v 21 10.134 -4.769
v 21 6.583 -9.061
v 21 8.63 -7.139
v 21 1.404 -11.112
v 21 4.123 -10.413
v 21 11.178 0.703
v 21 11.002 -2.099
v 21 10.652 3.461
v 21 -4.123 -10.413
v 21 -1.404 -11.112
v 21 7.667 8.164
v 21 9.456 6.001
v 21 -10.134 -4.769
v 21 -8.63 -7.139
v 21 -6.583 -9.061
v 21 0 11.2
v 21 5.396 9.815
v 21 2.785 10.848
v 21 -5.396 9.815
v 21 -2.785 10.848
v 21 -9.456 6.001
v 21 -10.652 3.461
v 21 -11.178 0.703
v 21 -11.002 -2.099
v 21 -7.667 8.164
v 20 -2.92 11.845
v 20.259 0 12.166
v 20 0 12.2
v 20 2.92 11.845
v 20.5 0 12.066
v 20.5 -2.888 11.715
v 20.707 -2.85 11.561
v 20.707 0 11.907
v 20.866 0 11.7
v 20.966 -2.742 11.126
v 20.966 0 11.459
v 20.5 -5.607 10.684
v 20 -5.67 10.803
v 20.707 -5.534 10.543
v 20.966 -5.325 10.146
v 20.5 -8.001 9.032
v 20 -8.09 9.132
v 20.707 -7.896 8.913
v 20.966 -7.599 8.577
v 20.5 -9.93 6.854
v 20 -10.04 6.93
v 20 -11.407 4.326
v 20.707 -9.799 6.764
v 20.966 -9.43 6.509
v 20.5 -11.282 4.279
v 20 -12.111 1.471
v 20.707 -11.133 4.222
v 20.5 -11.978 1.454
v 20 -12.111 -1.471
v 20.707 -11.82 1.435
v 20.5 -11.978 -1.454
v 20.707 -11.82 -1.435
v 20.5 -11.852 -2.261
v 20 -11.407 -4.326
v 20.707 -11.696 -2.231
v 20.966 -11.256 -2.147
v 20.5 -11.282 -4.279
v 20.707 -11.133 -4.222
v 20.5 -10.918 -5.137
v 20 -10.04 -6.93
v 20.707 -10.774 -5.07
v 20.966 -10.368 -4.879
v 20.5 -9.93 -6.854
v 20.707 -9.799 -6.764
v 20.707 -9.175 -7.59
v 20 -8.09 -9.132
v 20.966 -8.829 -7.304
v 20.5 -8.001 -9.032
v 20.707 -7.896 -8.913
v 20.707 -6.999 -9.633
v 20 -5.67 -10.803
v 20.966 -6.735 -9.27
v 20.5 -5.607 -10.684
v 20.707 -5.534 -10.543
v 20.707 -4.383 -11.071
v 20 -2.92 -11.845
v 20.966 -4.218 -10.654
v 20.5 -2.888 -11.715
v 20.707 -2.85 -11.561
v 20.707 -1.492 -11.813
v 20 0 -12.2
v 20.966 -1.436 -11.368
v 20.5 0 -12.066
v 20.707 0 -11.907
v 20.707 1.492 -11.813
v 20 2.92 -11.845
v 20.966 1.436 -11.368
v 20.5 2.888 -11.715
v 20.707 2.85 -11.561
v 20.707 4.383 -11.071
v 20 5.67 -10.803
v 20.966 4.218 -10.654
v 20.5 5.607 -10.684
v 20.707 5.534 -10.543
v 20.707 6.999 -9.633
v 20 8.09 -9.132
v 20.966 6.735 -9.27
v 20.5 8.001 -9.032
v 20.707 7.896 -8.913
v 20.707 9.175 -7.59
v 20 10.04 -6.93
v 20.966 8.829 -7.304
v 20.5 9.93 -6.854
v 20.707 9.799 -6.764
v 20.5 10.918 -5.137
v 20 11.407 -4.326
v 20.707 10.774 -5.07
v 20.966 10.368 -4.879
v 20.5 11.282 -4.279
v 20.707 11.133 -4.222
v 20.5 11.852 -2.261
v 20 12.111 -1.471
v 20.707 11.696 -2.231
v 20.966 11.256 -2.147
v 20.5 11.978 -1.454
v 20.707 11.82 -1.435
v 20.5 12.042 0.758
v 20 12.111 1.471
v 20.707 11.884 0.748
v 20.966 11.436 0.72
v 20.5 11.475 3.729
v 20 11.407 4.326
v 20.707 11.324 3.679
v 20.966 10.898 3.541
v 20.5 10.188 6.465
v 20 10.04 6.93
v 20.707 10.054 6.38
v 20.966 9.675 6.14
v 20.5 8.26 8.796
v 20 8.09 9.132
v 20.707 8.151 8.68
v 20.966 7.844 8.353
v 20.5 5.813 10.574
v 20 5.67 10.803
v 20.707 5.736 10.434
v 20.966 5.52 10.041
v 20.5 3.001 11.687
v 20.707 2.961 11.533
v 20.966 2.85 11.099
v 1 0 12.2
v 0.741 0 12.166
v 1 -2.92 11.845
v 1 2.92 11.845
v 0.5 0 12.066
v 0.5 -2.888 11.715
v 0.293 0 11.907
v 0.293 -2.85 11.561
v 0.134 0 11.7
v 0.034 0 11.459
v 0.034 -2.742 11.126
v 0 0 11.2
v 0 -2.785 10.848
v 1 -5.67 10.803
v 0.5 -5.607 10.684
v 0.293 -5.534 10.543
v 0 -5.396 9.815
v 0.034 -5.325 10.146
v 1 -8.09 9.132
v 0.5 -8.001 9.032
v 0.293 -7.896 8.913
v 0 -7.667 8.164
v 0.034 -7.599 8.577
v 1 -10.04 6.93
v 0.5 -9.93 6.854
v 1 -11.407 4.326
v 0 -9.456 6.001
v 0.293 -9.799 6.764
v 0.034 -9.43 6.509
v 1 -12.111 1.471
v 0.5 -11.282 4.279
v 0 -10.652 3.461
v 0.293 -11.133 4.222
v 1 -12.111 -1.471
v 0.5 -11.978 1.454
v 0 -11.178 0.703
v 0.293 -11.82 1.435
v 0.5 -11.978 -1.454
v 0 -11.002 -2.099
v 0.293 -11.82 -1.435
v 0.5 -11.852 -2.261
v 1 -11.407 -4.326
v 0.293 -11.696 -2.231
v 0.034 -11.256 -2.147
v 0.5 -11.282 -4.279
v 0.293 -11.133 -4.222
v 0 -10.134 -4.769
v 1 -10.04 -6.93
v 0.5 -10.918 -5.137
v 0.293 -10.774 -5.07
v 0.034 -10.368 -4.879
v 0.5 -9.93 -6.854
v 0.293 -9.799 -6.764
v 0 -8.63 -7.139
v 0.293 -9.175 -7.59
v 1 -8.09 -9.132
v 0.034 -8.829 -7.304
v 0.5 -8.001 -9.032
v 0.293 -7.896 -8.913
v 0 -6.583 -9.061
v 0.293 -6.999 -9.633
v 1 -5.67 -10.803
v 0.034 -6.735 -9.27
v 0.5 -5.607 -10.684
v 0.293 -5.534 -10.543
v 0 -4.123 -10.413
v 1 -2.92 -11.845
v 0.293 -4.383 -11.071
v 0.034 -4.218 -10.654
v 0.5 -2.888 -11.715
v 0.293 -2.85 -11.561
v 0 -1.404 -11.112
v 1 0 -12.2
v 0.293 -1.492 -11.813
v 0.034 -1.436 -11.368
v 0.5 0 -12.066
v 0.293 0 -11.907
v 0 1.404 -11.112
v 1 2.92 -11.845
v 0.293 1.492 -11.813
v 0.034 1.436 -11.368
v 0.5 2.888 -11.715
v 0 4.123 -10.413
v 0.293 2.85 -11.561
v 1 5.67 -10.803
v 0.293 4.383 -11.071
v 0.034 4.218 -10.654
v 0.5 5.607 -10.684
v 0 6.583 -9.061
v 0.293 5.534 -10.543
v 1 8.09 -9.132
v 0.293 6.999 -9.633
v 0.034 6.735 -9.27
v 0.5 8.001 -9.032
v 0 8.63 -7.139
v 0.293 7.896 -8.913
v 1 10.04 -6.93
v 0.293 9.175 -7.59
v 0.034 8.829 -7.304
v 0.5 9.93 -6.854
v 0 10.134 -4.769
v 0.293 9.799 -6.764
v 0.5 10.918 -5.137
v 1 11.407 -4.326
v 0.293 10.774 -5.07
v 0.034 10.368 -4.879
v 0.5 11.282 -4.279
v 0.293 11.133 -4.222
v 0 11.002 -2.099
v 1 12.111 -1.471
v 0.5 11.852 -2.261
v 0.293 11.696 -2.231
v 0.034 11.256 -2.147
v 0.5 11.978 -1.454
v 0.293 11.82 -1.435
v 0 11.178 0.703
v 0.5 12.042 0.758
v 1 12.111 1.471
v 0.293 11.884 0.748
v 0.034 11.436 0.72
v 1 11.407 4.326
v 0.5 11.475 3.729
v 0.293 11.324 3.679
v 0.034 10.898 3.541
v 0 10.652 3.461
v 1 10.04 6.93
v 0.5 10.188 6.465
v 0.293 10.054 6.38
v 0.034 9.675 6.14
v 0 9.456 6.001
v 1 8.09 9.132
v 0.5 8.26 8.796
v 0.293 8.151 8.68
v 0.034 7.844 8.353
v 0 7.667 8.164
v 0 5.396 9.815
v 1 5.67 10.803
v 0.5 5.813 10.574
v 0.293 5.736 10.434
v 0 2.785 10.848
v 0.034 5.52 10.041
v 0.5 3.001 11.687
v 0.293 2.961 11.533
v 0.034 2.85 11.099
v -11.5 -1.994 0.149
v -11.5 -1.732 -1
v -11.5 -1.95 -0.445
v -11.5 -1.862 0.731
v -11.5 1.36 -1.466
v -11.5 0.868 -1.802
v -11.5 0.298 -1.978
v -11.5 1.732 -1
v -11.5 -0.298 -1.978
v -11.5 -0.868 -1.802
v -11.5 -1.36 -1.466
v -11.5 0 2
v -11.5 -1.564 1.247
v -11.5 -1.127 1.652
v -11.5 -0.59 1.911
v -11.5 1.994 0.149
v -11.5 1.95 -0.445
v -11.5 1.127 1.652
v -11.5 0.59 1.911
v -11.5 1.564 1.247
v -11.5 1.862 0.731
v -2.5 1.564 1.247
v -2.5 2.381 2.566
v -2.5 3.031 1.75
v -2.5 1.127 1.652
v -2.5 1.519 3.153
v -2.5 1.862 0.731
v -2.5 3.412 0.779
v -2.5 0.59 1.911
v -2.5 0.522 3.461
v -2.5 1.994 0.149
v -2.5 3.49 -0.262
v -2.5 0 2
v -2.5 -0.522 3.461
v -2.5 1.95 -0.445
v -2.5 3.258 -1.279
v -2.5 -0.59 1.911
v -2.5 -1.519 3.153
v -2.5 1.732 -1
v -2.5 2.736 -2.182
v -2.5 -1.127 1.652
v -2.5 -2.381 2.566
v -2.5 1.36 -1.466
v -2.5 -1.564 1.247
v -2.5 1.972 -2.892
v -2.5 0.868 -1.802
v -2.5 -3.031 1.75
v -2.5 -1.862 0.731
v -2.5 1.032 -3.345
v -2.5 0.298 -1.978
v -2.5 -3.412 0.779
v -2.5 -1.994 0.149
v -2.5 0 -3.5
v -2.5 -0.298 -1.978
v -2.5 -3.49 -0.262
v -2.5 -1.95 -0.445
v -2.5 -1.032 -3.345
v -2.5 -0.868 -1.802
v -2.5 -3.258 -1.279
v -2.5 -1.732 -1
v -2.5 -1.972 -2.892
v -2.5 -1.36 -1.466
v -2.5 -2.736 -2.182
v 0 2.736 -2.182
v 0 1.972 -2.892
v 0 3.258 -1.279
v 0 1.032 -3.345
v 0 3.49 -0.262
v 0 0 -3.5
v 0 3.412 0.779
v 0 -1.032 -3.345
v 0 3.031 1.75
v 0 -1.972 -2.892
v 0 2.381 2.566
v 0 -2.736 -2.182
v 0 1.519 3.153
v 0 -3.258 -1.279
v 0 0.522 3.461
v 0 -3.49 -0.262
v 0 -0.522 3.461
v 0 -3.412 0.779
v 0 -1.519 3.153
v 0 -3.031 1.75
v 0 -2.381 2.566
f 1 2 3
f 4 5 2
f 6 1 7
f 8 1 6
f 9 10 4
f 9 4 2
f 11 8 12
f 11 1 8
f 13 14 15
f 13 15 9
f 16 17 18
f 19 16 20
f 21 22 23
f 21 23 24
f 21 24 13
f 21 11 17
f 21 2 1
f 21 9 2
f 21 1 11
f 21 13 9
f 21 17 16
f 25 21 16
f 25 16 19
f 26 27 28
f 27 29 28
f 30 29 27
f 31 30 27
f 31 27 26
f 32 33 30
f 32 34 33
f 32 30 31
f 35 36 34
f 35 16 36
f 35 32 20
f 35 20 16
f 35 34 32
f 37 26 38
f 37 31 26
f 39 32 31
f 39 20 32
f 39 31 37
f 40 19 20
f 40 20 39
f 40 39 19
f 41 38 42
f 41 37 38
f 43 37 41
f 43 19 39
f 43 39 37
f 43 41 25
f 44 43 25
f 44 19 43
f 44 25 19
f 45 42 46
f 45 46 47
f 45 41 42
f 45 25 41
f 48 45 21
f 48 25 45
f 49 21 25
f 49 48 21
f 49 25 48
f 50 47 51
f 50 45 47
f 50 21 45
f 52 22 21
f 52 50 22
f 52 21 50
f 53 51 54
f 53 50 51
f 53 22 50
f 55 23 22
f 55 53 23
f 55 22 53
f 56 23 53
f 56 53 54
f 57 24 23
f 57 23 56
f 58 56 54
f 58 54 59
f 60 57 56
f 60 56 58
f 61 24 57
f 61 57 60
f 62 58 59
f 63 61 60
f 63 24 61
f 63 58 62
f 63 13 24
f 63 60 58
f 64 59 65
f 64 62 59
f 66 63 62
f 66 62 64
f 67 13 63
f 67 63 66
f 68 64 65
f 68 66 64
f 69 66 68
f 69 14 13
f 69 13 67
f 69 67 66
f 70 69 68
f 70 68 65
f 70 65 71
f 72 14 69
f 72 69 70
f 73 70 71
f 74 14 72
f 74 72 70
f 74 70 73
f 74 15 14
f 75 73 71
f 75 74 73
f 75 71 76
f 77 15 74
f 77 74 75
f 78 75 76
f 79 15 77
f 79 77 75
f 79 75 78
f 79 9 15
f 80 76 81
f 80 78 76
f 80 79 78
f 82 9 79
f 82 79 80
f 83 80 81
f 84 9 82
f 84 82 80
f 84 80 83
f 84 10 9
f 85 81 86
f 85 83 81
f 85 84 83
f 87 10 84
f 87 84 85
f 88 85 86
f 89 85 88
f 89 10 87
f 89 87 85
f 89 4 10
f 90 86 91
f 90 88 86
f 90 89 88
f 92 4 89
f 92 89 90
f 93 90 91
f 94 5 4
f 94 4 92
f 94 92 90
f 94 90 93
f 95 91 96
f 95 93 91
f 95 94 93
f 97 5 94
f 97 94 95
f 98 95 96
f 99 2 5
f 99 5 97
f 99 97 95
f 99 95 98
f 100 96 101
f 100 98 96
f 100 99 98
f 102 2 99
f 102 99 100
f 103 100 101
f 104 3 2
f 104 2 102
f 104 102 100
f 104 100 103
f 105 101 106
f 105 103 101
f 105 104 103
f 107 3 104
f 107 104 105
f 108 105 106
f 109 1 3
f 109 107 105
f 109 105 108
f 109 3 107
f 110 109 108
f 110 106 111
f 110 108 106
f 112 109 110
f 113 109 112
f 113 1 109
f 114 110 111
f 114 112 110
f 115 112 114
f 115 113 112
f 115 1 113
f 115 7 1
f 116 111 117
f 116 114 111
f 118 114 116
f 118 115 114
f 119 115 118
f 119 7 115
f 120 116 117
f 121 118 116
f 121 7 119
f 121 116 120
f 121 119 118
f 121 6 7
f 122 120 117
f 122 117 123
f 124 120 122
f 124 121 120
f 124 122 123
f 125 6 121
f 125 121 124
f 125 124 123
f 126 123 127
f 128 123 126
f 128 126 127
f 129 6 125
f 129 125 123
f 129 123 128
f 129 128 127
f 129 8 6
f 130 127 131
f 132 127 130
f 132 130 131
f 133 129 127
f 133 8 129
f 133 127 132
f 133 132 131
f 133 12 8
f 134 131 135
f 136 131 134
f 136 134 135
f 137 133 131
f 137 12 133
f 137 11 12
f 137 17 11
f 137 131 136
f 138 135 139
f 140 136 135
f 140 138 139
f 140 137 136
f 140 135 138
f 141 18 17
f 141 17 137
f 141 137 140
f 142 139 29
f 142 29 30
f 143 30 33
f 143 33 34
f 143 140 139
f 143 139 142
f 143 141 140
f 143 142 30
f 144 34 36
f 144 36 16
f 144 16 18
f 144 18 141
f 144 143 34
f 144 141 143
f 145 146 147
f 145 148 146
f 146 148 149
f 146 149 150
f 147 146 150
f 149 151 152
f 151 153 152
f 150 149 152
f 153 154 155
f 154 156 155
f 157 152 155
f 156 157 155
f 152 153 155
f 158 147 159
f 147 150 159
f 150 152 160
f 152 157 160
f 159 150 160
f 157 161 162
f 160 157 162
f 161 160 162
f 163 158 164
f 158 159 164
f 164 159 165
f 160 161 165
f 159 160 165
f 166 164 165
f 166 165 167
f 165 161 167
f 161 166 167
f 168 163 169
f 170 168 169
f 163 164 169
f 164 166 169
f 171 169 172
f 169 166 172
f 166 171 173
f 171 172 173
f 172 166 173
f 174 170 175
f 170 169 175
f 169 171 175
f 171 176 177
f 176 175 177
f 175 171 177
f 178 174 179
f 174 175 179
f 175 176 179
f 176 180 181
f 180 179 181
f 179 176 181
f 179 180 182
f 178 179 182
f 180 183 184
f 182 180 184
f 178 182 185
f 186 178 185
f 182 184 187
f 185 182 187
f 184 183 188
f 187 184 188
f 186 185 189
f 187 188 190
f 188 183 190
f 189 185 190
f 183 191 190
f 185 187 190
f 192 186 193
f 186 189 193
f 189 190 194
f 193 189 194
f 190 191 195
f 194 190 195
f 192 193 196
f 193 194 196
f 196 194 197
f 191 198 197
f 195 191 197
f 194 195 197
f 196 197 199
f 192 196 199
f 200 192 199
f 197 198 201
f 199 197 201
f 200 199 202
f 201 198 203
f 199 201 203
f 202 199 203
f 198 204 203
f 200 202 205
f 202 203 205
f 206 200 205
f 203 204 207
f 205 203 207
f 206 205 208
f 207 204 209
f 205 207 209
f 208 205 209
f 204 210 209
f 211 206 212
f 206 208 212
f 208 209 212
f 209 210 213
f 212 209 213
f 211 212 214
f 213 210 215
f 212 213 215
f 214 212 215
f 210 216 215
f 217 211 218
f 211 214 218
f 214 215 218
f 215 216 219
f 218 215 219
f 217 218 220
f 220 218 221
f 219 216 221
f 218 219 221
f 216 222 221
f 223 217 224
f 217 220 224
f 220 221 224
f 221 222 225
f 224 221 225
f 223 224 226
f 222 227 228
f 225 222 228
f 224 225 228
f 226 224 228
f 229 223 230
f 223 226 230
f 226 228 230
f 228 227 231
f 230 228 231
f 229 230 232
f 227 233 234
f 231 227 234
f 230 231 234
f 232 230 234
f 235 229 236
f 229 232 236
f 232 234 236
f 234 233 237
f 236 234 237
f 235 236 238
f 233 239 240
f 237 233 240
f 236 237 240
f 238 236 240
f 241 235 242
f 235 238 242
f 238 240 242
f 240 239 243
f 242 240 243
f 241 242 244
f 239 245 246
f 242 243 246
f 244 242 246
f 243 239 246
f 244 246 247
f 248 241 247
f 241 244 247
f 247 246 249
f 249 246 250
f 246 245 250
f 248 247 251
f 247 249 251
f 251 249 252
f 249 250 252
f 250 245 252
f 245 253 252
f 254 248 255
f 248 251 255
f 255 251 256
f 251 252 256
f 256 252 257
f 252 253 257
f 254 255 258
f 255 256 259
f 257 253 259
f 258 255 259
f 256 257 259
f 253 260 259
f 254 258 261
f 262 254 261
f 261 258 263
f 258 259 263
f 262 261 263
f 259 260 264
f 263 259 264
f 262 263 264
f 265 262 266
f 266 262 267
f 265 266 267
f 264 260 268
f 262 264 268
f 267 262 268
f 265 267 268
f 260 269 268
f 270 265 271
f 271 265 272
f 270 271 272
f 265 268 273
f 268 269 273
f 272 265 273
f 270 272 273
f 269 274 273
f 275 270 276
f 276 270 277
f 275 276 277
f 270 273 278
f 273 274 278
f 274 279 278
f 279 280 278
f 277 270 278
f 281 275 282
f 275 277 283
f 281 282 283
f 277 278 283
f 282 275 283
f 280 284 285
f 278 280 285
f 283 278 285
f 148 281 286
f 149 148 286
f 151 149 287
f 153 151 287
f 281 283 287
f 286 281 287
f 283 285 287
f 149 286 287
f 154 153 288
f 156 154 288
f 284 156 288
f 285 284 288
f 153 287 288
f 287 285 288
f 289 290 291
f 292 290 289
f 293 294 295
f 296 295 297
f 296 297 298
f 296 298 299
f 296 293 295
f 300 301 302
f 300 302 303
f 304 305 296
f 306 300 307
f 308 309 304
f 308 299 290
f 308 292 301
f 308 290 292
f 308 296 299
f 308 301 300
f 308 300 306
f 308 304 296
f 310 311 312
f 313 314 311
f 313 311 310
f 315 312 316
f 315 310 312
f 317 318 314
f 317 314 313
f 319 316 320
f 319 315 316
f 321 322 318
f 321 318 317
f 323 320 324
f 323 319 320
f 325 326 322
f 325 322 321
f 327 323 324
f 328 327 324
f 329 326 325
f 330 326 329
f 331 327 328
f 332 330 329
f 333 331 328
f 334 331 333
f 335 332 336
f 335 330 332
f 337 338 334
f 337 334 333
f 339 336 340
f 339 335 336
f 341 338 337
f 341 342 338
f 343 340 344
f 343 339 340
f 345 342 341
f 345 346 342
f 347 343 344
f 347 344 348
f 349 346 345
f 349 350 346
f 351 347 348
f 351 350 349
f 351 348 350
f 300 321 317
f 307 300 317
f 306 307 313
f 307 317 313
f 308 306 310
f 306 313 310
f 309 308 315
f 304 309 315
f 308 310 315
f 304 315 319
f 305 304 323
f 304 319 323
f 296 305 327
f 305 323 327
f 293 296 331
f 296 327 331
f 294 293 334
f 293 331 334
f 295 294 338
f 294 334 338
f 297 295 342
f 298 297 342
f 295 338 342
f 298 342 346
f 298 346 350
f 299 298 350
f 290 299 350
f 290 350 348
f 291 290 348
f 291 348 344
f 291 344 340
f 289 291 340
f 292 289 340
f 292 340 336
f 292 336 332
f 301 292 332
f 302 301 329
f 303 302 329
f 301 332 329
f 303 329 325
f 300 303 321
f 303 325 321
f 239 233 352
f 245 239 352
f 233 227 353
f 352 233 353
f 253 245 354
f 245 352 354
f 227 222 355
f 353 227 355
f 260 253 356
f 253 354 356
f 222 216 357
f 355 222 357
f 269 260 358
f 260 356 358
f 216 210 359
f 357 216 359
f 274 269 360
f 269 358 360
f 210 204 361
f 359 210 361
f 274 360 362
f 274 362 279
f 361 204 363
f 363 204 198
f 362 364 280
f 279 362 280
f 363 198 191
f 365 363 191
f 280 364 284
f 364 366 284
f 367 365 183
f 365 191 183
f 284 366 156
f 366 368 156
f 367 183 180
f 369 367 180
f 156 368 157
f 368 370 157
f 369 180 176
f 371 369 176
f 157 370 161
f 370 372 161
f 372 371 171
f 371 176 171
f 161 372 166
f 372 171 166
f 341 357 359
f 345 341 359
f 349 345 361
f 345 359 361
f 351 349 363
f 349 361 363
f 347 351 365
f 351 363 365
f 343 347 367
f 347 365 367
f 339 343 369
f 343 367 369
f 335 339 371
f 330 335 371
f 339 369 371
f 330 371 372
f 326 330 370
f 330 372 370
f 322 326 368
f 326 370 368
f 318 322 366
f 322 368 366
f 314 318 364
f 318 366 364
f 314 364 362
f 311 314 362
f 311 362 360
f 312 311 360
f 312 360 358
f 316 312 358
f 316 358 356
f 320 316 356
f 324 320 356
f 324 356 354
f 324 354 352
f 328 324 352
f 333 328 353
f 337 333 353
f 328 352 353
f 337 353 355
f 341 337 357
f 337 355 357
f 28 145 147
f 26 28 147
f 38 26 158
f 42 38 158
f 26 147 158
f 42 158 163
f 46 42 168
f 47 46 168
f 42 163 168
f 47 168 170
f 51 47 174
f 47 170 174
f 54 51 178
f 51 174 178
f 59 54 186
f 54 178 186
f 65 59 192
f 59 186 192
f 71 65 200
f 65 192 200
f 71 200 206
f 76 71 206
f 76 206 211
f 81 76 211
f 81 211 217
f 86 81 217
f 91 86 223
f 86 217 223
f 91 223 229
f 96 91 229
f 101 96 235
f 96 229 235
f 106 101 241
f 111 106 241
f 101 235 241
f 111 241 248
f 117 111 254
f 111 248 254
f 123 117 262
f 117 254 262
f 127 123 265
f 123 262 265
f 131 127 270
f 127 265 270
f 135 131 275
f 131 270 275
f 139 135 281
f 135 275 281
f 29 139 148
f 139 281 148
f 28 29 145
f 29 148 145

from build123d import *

# Parameters (mm, degrees)
SKETCH_1_R      = 12.2
EXTRUDE_1_DEPTH = 21
FILLET_1_R      = 1
SKETCH_2_R      = 3.5
EXTRUDE_2_DEPTH = 2.5
SKETCH_3_R      = 2
EXTRUDE_3_DEPTH = 9


with BuildPart() as part:
    # 草图1 → 凸台-拉伸1 (new body)
    with BuildSketch(Plane(origin=(0, 0, 0), x_dir=(0, 0, -1), z_dir=(1, 0, 0))):
        with Locations(Location((0, 0, 0), (0, 0, 180))):
            Circle(SKETCH_1_R)
    extrude(amount=EXTRUDE_1_DEPTH)

    # 圆角1
    fillet_1_edges = [part.edges().sort_by_distance(p)[0] for p in [
        (0, 0, -12.2),
        (21, 0, -12.2),
    ]]
    fillet(fillet_1_edges, radius=FILLET_1_R)

    # 草图2 → 凸台-拉伸2 (add)
    with BuildSketch(Plane.ZY):
        with Locations(Location((0, 0, 0), (0, 0, 180))):
            Circle(SKETCH_2_R)
    extrude(amount=EXTRUDE_2_DEPTH)

    # 草图3 → 凸台-拉伸3 (add)
    with BuildSketch(Plane.ZY.offset(2.5)):
        Circle(SKETCH_3_R)
    extrude(amount=EXTRUDE_3_DEPTH)


solid = part.part
